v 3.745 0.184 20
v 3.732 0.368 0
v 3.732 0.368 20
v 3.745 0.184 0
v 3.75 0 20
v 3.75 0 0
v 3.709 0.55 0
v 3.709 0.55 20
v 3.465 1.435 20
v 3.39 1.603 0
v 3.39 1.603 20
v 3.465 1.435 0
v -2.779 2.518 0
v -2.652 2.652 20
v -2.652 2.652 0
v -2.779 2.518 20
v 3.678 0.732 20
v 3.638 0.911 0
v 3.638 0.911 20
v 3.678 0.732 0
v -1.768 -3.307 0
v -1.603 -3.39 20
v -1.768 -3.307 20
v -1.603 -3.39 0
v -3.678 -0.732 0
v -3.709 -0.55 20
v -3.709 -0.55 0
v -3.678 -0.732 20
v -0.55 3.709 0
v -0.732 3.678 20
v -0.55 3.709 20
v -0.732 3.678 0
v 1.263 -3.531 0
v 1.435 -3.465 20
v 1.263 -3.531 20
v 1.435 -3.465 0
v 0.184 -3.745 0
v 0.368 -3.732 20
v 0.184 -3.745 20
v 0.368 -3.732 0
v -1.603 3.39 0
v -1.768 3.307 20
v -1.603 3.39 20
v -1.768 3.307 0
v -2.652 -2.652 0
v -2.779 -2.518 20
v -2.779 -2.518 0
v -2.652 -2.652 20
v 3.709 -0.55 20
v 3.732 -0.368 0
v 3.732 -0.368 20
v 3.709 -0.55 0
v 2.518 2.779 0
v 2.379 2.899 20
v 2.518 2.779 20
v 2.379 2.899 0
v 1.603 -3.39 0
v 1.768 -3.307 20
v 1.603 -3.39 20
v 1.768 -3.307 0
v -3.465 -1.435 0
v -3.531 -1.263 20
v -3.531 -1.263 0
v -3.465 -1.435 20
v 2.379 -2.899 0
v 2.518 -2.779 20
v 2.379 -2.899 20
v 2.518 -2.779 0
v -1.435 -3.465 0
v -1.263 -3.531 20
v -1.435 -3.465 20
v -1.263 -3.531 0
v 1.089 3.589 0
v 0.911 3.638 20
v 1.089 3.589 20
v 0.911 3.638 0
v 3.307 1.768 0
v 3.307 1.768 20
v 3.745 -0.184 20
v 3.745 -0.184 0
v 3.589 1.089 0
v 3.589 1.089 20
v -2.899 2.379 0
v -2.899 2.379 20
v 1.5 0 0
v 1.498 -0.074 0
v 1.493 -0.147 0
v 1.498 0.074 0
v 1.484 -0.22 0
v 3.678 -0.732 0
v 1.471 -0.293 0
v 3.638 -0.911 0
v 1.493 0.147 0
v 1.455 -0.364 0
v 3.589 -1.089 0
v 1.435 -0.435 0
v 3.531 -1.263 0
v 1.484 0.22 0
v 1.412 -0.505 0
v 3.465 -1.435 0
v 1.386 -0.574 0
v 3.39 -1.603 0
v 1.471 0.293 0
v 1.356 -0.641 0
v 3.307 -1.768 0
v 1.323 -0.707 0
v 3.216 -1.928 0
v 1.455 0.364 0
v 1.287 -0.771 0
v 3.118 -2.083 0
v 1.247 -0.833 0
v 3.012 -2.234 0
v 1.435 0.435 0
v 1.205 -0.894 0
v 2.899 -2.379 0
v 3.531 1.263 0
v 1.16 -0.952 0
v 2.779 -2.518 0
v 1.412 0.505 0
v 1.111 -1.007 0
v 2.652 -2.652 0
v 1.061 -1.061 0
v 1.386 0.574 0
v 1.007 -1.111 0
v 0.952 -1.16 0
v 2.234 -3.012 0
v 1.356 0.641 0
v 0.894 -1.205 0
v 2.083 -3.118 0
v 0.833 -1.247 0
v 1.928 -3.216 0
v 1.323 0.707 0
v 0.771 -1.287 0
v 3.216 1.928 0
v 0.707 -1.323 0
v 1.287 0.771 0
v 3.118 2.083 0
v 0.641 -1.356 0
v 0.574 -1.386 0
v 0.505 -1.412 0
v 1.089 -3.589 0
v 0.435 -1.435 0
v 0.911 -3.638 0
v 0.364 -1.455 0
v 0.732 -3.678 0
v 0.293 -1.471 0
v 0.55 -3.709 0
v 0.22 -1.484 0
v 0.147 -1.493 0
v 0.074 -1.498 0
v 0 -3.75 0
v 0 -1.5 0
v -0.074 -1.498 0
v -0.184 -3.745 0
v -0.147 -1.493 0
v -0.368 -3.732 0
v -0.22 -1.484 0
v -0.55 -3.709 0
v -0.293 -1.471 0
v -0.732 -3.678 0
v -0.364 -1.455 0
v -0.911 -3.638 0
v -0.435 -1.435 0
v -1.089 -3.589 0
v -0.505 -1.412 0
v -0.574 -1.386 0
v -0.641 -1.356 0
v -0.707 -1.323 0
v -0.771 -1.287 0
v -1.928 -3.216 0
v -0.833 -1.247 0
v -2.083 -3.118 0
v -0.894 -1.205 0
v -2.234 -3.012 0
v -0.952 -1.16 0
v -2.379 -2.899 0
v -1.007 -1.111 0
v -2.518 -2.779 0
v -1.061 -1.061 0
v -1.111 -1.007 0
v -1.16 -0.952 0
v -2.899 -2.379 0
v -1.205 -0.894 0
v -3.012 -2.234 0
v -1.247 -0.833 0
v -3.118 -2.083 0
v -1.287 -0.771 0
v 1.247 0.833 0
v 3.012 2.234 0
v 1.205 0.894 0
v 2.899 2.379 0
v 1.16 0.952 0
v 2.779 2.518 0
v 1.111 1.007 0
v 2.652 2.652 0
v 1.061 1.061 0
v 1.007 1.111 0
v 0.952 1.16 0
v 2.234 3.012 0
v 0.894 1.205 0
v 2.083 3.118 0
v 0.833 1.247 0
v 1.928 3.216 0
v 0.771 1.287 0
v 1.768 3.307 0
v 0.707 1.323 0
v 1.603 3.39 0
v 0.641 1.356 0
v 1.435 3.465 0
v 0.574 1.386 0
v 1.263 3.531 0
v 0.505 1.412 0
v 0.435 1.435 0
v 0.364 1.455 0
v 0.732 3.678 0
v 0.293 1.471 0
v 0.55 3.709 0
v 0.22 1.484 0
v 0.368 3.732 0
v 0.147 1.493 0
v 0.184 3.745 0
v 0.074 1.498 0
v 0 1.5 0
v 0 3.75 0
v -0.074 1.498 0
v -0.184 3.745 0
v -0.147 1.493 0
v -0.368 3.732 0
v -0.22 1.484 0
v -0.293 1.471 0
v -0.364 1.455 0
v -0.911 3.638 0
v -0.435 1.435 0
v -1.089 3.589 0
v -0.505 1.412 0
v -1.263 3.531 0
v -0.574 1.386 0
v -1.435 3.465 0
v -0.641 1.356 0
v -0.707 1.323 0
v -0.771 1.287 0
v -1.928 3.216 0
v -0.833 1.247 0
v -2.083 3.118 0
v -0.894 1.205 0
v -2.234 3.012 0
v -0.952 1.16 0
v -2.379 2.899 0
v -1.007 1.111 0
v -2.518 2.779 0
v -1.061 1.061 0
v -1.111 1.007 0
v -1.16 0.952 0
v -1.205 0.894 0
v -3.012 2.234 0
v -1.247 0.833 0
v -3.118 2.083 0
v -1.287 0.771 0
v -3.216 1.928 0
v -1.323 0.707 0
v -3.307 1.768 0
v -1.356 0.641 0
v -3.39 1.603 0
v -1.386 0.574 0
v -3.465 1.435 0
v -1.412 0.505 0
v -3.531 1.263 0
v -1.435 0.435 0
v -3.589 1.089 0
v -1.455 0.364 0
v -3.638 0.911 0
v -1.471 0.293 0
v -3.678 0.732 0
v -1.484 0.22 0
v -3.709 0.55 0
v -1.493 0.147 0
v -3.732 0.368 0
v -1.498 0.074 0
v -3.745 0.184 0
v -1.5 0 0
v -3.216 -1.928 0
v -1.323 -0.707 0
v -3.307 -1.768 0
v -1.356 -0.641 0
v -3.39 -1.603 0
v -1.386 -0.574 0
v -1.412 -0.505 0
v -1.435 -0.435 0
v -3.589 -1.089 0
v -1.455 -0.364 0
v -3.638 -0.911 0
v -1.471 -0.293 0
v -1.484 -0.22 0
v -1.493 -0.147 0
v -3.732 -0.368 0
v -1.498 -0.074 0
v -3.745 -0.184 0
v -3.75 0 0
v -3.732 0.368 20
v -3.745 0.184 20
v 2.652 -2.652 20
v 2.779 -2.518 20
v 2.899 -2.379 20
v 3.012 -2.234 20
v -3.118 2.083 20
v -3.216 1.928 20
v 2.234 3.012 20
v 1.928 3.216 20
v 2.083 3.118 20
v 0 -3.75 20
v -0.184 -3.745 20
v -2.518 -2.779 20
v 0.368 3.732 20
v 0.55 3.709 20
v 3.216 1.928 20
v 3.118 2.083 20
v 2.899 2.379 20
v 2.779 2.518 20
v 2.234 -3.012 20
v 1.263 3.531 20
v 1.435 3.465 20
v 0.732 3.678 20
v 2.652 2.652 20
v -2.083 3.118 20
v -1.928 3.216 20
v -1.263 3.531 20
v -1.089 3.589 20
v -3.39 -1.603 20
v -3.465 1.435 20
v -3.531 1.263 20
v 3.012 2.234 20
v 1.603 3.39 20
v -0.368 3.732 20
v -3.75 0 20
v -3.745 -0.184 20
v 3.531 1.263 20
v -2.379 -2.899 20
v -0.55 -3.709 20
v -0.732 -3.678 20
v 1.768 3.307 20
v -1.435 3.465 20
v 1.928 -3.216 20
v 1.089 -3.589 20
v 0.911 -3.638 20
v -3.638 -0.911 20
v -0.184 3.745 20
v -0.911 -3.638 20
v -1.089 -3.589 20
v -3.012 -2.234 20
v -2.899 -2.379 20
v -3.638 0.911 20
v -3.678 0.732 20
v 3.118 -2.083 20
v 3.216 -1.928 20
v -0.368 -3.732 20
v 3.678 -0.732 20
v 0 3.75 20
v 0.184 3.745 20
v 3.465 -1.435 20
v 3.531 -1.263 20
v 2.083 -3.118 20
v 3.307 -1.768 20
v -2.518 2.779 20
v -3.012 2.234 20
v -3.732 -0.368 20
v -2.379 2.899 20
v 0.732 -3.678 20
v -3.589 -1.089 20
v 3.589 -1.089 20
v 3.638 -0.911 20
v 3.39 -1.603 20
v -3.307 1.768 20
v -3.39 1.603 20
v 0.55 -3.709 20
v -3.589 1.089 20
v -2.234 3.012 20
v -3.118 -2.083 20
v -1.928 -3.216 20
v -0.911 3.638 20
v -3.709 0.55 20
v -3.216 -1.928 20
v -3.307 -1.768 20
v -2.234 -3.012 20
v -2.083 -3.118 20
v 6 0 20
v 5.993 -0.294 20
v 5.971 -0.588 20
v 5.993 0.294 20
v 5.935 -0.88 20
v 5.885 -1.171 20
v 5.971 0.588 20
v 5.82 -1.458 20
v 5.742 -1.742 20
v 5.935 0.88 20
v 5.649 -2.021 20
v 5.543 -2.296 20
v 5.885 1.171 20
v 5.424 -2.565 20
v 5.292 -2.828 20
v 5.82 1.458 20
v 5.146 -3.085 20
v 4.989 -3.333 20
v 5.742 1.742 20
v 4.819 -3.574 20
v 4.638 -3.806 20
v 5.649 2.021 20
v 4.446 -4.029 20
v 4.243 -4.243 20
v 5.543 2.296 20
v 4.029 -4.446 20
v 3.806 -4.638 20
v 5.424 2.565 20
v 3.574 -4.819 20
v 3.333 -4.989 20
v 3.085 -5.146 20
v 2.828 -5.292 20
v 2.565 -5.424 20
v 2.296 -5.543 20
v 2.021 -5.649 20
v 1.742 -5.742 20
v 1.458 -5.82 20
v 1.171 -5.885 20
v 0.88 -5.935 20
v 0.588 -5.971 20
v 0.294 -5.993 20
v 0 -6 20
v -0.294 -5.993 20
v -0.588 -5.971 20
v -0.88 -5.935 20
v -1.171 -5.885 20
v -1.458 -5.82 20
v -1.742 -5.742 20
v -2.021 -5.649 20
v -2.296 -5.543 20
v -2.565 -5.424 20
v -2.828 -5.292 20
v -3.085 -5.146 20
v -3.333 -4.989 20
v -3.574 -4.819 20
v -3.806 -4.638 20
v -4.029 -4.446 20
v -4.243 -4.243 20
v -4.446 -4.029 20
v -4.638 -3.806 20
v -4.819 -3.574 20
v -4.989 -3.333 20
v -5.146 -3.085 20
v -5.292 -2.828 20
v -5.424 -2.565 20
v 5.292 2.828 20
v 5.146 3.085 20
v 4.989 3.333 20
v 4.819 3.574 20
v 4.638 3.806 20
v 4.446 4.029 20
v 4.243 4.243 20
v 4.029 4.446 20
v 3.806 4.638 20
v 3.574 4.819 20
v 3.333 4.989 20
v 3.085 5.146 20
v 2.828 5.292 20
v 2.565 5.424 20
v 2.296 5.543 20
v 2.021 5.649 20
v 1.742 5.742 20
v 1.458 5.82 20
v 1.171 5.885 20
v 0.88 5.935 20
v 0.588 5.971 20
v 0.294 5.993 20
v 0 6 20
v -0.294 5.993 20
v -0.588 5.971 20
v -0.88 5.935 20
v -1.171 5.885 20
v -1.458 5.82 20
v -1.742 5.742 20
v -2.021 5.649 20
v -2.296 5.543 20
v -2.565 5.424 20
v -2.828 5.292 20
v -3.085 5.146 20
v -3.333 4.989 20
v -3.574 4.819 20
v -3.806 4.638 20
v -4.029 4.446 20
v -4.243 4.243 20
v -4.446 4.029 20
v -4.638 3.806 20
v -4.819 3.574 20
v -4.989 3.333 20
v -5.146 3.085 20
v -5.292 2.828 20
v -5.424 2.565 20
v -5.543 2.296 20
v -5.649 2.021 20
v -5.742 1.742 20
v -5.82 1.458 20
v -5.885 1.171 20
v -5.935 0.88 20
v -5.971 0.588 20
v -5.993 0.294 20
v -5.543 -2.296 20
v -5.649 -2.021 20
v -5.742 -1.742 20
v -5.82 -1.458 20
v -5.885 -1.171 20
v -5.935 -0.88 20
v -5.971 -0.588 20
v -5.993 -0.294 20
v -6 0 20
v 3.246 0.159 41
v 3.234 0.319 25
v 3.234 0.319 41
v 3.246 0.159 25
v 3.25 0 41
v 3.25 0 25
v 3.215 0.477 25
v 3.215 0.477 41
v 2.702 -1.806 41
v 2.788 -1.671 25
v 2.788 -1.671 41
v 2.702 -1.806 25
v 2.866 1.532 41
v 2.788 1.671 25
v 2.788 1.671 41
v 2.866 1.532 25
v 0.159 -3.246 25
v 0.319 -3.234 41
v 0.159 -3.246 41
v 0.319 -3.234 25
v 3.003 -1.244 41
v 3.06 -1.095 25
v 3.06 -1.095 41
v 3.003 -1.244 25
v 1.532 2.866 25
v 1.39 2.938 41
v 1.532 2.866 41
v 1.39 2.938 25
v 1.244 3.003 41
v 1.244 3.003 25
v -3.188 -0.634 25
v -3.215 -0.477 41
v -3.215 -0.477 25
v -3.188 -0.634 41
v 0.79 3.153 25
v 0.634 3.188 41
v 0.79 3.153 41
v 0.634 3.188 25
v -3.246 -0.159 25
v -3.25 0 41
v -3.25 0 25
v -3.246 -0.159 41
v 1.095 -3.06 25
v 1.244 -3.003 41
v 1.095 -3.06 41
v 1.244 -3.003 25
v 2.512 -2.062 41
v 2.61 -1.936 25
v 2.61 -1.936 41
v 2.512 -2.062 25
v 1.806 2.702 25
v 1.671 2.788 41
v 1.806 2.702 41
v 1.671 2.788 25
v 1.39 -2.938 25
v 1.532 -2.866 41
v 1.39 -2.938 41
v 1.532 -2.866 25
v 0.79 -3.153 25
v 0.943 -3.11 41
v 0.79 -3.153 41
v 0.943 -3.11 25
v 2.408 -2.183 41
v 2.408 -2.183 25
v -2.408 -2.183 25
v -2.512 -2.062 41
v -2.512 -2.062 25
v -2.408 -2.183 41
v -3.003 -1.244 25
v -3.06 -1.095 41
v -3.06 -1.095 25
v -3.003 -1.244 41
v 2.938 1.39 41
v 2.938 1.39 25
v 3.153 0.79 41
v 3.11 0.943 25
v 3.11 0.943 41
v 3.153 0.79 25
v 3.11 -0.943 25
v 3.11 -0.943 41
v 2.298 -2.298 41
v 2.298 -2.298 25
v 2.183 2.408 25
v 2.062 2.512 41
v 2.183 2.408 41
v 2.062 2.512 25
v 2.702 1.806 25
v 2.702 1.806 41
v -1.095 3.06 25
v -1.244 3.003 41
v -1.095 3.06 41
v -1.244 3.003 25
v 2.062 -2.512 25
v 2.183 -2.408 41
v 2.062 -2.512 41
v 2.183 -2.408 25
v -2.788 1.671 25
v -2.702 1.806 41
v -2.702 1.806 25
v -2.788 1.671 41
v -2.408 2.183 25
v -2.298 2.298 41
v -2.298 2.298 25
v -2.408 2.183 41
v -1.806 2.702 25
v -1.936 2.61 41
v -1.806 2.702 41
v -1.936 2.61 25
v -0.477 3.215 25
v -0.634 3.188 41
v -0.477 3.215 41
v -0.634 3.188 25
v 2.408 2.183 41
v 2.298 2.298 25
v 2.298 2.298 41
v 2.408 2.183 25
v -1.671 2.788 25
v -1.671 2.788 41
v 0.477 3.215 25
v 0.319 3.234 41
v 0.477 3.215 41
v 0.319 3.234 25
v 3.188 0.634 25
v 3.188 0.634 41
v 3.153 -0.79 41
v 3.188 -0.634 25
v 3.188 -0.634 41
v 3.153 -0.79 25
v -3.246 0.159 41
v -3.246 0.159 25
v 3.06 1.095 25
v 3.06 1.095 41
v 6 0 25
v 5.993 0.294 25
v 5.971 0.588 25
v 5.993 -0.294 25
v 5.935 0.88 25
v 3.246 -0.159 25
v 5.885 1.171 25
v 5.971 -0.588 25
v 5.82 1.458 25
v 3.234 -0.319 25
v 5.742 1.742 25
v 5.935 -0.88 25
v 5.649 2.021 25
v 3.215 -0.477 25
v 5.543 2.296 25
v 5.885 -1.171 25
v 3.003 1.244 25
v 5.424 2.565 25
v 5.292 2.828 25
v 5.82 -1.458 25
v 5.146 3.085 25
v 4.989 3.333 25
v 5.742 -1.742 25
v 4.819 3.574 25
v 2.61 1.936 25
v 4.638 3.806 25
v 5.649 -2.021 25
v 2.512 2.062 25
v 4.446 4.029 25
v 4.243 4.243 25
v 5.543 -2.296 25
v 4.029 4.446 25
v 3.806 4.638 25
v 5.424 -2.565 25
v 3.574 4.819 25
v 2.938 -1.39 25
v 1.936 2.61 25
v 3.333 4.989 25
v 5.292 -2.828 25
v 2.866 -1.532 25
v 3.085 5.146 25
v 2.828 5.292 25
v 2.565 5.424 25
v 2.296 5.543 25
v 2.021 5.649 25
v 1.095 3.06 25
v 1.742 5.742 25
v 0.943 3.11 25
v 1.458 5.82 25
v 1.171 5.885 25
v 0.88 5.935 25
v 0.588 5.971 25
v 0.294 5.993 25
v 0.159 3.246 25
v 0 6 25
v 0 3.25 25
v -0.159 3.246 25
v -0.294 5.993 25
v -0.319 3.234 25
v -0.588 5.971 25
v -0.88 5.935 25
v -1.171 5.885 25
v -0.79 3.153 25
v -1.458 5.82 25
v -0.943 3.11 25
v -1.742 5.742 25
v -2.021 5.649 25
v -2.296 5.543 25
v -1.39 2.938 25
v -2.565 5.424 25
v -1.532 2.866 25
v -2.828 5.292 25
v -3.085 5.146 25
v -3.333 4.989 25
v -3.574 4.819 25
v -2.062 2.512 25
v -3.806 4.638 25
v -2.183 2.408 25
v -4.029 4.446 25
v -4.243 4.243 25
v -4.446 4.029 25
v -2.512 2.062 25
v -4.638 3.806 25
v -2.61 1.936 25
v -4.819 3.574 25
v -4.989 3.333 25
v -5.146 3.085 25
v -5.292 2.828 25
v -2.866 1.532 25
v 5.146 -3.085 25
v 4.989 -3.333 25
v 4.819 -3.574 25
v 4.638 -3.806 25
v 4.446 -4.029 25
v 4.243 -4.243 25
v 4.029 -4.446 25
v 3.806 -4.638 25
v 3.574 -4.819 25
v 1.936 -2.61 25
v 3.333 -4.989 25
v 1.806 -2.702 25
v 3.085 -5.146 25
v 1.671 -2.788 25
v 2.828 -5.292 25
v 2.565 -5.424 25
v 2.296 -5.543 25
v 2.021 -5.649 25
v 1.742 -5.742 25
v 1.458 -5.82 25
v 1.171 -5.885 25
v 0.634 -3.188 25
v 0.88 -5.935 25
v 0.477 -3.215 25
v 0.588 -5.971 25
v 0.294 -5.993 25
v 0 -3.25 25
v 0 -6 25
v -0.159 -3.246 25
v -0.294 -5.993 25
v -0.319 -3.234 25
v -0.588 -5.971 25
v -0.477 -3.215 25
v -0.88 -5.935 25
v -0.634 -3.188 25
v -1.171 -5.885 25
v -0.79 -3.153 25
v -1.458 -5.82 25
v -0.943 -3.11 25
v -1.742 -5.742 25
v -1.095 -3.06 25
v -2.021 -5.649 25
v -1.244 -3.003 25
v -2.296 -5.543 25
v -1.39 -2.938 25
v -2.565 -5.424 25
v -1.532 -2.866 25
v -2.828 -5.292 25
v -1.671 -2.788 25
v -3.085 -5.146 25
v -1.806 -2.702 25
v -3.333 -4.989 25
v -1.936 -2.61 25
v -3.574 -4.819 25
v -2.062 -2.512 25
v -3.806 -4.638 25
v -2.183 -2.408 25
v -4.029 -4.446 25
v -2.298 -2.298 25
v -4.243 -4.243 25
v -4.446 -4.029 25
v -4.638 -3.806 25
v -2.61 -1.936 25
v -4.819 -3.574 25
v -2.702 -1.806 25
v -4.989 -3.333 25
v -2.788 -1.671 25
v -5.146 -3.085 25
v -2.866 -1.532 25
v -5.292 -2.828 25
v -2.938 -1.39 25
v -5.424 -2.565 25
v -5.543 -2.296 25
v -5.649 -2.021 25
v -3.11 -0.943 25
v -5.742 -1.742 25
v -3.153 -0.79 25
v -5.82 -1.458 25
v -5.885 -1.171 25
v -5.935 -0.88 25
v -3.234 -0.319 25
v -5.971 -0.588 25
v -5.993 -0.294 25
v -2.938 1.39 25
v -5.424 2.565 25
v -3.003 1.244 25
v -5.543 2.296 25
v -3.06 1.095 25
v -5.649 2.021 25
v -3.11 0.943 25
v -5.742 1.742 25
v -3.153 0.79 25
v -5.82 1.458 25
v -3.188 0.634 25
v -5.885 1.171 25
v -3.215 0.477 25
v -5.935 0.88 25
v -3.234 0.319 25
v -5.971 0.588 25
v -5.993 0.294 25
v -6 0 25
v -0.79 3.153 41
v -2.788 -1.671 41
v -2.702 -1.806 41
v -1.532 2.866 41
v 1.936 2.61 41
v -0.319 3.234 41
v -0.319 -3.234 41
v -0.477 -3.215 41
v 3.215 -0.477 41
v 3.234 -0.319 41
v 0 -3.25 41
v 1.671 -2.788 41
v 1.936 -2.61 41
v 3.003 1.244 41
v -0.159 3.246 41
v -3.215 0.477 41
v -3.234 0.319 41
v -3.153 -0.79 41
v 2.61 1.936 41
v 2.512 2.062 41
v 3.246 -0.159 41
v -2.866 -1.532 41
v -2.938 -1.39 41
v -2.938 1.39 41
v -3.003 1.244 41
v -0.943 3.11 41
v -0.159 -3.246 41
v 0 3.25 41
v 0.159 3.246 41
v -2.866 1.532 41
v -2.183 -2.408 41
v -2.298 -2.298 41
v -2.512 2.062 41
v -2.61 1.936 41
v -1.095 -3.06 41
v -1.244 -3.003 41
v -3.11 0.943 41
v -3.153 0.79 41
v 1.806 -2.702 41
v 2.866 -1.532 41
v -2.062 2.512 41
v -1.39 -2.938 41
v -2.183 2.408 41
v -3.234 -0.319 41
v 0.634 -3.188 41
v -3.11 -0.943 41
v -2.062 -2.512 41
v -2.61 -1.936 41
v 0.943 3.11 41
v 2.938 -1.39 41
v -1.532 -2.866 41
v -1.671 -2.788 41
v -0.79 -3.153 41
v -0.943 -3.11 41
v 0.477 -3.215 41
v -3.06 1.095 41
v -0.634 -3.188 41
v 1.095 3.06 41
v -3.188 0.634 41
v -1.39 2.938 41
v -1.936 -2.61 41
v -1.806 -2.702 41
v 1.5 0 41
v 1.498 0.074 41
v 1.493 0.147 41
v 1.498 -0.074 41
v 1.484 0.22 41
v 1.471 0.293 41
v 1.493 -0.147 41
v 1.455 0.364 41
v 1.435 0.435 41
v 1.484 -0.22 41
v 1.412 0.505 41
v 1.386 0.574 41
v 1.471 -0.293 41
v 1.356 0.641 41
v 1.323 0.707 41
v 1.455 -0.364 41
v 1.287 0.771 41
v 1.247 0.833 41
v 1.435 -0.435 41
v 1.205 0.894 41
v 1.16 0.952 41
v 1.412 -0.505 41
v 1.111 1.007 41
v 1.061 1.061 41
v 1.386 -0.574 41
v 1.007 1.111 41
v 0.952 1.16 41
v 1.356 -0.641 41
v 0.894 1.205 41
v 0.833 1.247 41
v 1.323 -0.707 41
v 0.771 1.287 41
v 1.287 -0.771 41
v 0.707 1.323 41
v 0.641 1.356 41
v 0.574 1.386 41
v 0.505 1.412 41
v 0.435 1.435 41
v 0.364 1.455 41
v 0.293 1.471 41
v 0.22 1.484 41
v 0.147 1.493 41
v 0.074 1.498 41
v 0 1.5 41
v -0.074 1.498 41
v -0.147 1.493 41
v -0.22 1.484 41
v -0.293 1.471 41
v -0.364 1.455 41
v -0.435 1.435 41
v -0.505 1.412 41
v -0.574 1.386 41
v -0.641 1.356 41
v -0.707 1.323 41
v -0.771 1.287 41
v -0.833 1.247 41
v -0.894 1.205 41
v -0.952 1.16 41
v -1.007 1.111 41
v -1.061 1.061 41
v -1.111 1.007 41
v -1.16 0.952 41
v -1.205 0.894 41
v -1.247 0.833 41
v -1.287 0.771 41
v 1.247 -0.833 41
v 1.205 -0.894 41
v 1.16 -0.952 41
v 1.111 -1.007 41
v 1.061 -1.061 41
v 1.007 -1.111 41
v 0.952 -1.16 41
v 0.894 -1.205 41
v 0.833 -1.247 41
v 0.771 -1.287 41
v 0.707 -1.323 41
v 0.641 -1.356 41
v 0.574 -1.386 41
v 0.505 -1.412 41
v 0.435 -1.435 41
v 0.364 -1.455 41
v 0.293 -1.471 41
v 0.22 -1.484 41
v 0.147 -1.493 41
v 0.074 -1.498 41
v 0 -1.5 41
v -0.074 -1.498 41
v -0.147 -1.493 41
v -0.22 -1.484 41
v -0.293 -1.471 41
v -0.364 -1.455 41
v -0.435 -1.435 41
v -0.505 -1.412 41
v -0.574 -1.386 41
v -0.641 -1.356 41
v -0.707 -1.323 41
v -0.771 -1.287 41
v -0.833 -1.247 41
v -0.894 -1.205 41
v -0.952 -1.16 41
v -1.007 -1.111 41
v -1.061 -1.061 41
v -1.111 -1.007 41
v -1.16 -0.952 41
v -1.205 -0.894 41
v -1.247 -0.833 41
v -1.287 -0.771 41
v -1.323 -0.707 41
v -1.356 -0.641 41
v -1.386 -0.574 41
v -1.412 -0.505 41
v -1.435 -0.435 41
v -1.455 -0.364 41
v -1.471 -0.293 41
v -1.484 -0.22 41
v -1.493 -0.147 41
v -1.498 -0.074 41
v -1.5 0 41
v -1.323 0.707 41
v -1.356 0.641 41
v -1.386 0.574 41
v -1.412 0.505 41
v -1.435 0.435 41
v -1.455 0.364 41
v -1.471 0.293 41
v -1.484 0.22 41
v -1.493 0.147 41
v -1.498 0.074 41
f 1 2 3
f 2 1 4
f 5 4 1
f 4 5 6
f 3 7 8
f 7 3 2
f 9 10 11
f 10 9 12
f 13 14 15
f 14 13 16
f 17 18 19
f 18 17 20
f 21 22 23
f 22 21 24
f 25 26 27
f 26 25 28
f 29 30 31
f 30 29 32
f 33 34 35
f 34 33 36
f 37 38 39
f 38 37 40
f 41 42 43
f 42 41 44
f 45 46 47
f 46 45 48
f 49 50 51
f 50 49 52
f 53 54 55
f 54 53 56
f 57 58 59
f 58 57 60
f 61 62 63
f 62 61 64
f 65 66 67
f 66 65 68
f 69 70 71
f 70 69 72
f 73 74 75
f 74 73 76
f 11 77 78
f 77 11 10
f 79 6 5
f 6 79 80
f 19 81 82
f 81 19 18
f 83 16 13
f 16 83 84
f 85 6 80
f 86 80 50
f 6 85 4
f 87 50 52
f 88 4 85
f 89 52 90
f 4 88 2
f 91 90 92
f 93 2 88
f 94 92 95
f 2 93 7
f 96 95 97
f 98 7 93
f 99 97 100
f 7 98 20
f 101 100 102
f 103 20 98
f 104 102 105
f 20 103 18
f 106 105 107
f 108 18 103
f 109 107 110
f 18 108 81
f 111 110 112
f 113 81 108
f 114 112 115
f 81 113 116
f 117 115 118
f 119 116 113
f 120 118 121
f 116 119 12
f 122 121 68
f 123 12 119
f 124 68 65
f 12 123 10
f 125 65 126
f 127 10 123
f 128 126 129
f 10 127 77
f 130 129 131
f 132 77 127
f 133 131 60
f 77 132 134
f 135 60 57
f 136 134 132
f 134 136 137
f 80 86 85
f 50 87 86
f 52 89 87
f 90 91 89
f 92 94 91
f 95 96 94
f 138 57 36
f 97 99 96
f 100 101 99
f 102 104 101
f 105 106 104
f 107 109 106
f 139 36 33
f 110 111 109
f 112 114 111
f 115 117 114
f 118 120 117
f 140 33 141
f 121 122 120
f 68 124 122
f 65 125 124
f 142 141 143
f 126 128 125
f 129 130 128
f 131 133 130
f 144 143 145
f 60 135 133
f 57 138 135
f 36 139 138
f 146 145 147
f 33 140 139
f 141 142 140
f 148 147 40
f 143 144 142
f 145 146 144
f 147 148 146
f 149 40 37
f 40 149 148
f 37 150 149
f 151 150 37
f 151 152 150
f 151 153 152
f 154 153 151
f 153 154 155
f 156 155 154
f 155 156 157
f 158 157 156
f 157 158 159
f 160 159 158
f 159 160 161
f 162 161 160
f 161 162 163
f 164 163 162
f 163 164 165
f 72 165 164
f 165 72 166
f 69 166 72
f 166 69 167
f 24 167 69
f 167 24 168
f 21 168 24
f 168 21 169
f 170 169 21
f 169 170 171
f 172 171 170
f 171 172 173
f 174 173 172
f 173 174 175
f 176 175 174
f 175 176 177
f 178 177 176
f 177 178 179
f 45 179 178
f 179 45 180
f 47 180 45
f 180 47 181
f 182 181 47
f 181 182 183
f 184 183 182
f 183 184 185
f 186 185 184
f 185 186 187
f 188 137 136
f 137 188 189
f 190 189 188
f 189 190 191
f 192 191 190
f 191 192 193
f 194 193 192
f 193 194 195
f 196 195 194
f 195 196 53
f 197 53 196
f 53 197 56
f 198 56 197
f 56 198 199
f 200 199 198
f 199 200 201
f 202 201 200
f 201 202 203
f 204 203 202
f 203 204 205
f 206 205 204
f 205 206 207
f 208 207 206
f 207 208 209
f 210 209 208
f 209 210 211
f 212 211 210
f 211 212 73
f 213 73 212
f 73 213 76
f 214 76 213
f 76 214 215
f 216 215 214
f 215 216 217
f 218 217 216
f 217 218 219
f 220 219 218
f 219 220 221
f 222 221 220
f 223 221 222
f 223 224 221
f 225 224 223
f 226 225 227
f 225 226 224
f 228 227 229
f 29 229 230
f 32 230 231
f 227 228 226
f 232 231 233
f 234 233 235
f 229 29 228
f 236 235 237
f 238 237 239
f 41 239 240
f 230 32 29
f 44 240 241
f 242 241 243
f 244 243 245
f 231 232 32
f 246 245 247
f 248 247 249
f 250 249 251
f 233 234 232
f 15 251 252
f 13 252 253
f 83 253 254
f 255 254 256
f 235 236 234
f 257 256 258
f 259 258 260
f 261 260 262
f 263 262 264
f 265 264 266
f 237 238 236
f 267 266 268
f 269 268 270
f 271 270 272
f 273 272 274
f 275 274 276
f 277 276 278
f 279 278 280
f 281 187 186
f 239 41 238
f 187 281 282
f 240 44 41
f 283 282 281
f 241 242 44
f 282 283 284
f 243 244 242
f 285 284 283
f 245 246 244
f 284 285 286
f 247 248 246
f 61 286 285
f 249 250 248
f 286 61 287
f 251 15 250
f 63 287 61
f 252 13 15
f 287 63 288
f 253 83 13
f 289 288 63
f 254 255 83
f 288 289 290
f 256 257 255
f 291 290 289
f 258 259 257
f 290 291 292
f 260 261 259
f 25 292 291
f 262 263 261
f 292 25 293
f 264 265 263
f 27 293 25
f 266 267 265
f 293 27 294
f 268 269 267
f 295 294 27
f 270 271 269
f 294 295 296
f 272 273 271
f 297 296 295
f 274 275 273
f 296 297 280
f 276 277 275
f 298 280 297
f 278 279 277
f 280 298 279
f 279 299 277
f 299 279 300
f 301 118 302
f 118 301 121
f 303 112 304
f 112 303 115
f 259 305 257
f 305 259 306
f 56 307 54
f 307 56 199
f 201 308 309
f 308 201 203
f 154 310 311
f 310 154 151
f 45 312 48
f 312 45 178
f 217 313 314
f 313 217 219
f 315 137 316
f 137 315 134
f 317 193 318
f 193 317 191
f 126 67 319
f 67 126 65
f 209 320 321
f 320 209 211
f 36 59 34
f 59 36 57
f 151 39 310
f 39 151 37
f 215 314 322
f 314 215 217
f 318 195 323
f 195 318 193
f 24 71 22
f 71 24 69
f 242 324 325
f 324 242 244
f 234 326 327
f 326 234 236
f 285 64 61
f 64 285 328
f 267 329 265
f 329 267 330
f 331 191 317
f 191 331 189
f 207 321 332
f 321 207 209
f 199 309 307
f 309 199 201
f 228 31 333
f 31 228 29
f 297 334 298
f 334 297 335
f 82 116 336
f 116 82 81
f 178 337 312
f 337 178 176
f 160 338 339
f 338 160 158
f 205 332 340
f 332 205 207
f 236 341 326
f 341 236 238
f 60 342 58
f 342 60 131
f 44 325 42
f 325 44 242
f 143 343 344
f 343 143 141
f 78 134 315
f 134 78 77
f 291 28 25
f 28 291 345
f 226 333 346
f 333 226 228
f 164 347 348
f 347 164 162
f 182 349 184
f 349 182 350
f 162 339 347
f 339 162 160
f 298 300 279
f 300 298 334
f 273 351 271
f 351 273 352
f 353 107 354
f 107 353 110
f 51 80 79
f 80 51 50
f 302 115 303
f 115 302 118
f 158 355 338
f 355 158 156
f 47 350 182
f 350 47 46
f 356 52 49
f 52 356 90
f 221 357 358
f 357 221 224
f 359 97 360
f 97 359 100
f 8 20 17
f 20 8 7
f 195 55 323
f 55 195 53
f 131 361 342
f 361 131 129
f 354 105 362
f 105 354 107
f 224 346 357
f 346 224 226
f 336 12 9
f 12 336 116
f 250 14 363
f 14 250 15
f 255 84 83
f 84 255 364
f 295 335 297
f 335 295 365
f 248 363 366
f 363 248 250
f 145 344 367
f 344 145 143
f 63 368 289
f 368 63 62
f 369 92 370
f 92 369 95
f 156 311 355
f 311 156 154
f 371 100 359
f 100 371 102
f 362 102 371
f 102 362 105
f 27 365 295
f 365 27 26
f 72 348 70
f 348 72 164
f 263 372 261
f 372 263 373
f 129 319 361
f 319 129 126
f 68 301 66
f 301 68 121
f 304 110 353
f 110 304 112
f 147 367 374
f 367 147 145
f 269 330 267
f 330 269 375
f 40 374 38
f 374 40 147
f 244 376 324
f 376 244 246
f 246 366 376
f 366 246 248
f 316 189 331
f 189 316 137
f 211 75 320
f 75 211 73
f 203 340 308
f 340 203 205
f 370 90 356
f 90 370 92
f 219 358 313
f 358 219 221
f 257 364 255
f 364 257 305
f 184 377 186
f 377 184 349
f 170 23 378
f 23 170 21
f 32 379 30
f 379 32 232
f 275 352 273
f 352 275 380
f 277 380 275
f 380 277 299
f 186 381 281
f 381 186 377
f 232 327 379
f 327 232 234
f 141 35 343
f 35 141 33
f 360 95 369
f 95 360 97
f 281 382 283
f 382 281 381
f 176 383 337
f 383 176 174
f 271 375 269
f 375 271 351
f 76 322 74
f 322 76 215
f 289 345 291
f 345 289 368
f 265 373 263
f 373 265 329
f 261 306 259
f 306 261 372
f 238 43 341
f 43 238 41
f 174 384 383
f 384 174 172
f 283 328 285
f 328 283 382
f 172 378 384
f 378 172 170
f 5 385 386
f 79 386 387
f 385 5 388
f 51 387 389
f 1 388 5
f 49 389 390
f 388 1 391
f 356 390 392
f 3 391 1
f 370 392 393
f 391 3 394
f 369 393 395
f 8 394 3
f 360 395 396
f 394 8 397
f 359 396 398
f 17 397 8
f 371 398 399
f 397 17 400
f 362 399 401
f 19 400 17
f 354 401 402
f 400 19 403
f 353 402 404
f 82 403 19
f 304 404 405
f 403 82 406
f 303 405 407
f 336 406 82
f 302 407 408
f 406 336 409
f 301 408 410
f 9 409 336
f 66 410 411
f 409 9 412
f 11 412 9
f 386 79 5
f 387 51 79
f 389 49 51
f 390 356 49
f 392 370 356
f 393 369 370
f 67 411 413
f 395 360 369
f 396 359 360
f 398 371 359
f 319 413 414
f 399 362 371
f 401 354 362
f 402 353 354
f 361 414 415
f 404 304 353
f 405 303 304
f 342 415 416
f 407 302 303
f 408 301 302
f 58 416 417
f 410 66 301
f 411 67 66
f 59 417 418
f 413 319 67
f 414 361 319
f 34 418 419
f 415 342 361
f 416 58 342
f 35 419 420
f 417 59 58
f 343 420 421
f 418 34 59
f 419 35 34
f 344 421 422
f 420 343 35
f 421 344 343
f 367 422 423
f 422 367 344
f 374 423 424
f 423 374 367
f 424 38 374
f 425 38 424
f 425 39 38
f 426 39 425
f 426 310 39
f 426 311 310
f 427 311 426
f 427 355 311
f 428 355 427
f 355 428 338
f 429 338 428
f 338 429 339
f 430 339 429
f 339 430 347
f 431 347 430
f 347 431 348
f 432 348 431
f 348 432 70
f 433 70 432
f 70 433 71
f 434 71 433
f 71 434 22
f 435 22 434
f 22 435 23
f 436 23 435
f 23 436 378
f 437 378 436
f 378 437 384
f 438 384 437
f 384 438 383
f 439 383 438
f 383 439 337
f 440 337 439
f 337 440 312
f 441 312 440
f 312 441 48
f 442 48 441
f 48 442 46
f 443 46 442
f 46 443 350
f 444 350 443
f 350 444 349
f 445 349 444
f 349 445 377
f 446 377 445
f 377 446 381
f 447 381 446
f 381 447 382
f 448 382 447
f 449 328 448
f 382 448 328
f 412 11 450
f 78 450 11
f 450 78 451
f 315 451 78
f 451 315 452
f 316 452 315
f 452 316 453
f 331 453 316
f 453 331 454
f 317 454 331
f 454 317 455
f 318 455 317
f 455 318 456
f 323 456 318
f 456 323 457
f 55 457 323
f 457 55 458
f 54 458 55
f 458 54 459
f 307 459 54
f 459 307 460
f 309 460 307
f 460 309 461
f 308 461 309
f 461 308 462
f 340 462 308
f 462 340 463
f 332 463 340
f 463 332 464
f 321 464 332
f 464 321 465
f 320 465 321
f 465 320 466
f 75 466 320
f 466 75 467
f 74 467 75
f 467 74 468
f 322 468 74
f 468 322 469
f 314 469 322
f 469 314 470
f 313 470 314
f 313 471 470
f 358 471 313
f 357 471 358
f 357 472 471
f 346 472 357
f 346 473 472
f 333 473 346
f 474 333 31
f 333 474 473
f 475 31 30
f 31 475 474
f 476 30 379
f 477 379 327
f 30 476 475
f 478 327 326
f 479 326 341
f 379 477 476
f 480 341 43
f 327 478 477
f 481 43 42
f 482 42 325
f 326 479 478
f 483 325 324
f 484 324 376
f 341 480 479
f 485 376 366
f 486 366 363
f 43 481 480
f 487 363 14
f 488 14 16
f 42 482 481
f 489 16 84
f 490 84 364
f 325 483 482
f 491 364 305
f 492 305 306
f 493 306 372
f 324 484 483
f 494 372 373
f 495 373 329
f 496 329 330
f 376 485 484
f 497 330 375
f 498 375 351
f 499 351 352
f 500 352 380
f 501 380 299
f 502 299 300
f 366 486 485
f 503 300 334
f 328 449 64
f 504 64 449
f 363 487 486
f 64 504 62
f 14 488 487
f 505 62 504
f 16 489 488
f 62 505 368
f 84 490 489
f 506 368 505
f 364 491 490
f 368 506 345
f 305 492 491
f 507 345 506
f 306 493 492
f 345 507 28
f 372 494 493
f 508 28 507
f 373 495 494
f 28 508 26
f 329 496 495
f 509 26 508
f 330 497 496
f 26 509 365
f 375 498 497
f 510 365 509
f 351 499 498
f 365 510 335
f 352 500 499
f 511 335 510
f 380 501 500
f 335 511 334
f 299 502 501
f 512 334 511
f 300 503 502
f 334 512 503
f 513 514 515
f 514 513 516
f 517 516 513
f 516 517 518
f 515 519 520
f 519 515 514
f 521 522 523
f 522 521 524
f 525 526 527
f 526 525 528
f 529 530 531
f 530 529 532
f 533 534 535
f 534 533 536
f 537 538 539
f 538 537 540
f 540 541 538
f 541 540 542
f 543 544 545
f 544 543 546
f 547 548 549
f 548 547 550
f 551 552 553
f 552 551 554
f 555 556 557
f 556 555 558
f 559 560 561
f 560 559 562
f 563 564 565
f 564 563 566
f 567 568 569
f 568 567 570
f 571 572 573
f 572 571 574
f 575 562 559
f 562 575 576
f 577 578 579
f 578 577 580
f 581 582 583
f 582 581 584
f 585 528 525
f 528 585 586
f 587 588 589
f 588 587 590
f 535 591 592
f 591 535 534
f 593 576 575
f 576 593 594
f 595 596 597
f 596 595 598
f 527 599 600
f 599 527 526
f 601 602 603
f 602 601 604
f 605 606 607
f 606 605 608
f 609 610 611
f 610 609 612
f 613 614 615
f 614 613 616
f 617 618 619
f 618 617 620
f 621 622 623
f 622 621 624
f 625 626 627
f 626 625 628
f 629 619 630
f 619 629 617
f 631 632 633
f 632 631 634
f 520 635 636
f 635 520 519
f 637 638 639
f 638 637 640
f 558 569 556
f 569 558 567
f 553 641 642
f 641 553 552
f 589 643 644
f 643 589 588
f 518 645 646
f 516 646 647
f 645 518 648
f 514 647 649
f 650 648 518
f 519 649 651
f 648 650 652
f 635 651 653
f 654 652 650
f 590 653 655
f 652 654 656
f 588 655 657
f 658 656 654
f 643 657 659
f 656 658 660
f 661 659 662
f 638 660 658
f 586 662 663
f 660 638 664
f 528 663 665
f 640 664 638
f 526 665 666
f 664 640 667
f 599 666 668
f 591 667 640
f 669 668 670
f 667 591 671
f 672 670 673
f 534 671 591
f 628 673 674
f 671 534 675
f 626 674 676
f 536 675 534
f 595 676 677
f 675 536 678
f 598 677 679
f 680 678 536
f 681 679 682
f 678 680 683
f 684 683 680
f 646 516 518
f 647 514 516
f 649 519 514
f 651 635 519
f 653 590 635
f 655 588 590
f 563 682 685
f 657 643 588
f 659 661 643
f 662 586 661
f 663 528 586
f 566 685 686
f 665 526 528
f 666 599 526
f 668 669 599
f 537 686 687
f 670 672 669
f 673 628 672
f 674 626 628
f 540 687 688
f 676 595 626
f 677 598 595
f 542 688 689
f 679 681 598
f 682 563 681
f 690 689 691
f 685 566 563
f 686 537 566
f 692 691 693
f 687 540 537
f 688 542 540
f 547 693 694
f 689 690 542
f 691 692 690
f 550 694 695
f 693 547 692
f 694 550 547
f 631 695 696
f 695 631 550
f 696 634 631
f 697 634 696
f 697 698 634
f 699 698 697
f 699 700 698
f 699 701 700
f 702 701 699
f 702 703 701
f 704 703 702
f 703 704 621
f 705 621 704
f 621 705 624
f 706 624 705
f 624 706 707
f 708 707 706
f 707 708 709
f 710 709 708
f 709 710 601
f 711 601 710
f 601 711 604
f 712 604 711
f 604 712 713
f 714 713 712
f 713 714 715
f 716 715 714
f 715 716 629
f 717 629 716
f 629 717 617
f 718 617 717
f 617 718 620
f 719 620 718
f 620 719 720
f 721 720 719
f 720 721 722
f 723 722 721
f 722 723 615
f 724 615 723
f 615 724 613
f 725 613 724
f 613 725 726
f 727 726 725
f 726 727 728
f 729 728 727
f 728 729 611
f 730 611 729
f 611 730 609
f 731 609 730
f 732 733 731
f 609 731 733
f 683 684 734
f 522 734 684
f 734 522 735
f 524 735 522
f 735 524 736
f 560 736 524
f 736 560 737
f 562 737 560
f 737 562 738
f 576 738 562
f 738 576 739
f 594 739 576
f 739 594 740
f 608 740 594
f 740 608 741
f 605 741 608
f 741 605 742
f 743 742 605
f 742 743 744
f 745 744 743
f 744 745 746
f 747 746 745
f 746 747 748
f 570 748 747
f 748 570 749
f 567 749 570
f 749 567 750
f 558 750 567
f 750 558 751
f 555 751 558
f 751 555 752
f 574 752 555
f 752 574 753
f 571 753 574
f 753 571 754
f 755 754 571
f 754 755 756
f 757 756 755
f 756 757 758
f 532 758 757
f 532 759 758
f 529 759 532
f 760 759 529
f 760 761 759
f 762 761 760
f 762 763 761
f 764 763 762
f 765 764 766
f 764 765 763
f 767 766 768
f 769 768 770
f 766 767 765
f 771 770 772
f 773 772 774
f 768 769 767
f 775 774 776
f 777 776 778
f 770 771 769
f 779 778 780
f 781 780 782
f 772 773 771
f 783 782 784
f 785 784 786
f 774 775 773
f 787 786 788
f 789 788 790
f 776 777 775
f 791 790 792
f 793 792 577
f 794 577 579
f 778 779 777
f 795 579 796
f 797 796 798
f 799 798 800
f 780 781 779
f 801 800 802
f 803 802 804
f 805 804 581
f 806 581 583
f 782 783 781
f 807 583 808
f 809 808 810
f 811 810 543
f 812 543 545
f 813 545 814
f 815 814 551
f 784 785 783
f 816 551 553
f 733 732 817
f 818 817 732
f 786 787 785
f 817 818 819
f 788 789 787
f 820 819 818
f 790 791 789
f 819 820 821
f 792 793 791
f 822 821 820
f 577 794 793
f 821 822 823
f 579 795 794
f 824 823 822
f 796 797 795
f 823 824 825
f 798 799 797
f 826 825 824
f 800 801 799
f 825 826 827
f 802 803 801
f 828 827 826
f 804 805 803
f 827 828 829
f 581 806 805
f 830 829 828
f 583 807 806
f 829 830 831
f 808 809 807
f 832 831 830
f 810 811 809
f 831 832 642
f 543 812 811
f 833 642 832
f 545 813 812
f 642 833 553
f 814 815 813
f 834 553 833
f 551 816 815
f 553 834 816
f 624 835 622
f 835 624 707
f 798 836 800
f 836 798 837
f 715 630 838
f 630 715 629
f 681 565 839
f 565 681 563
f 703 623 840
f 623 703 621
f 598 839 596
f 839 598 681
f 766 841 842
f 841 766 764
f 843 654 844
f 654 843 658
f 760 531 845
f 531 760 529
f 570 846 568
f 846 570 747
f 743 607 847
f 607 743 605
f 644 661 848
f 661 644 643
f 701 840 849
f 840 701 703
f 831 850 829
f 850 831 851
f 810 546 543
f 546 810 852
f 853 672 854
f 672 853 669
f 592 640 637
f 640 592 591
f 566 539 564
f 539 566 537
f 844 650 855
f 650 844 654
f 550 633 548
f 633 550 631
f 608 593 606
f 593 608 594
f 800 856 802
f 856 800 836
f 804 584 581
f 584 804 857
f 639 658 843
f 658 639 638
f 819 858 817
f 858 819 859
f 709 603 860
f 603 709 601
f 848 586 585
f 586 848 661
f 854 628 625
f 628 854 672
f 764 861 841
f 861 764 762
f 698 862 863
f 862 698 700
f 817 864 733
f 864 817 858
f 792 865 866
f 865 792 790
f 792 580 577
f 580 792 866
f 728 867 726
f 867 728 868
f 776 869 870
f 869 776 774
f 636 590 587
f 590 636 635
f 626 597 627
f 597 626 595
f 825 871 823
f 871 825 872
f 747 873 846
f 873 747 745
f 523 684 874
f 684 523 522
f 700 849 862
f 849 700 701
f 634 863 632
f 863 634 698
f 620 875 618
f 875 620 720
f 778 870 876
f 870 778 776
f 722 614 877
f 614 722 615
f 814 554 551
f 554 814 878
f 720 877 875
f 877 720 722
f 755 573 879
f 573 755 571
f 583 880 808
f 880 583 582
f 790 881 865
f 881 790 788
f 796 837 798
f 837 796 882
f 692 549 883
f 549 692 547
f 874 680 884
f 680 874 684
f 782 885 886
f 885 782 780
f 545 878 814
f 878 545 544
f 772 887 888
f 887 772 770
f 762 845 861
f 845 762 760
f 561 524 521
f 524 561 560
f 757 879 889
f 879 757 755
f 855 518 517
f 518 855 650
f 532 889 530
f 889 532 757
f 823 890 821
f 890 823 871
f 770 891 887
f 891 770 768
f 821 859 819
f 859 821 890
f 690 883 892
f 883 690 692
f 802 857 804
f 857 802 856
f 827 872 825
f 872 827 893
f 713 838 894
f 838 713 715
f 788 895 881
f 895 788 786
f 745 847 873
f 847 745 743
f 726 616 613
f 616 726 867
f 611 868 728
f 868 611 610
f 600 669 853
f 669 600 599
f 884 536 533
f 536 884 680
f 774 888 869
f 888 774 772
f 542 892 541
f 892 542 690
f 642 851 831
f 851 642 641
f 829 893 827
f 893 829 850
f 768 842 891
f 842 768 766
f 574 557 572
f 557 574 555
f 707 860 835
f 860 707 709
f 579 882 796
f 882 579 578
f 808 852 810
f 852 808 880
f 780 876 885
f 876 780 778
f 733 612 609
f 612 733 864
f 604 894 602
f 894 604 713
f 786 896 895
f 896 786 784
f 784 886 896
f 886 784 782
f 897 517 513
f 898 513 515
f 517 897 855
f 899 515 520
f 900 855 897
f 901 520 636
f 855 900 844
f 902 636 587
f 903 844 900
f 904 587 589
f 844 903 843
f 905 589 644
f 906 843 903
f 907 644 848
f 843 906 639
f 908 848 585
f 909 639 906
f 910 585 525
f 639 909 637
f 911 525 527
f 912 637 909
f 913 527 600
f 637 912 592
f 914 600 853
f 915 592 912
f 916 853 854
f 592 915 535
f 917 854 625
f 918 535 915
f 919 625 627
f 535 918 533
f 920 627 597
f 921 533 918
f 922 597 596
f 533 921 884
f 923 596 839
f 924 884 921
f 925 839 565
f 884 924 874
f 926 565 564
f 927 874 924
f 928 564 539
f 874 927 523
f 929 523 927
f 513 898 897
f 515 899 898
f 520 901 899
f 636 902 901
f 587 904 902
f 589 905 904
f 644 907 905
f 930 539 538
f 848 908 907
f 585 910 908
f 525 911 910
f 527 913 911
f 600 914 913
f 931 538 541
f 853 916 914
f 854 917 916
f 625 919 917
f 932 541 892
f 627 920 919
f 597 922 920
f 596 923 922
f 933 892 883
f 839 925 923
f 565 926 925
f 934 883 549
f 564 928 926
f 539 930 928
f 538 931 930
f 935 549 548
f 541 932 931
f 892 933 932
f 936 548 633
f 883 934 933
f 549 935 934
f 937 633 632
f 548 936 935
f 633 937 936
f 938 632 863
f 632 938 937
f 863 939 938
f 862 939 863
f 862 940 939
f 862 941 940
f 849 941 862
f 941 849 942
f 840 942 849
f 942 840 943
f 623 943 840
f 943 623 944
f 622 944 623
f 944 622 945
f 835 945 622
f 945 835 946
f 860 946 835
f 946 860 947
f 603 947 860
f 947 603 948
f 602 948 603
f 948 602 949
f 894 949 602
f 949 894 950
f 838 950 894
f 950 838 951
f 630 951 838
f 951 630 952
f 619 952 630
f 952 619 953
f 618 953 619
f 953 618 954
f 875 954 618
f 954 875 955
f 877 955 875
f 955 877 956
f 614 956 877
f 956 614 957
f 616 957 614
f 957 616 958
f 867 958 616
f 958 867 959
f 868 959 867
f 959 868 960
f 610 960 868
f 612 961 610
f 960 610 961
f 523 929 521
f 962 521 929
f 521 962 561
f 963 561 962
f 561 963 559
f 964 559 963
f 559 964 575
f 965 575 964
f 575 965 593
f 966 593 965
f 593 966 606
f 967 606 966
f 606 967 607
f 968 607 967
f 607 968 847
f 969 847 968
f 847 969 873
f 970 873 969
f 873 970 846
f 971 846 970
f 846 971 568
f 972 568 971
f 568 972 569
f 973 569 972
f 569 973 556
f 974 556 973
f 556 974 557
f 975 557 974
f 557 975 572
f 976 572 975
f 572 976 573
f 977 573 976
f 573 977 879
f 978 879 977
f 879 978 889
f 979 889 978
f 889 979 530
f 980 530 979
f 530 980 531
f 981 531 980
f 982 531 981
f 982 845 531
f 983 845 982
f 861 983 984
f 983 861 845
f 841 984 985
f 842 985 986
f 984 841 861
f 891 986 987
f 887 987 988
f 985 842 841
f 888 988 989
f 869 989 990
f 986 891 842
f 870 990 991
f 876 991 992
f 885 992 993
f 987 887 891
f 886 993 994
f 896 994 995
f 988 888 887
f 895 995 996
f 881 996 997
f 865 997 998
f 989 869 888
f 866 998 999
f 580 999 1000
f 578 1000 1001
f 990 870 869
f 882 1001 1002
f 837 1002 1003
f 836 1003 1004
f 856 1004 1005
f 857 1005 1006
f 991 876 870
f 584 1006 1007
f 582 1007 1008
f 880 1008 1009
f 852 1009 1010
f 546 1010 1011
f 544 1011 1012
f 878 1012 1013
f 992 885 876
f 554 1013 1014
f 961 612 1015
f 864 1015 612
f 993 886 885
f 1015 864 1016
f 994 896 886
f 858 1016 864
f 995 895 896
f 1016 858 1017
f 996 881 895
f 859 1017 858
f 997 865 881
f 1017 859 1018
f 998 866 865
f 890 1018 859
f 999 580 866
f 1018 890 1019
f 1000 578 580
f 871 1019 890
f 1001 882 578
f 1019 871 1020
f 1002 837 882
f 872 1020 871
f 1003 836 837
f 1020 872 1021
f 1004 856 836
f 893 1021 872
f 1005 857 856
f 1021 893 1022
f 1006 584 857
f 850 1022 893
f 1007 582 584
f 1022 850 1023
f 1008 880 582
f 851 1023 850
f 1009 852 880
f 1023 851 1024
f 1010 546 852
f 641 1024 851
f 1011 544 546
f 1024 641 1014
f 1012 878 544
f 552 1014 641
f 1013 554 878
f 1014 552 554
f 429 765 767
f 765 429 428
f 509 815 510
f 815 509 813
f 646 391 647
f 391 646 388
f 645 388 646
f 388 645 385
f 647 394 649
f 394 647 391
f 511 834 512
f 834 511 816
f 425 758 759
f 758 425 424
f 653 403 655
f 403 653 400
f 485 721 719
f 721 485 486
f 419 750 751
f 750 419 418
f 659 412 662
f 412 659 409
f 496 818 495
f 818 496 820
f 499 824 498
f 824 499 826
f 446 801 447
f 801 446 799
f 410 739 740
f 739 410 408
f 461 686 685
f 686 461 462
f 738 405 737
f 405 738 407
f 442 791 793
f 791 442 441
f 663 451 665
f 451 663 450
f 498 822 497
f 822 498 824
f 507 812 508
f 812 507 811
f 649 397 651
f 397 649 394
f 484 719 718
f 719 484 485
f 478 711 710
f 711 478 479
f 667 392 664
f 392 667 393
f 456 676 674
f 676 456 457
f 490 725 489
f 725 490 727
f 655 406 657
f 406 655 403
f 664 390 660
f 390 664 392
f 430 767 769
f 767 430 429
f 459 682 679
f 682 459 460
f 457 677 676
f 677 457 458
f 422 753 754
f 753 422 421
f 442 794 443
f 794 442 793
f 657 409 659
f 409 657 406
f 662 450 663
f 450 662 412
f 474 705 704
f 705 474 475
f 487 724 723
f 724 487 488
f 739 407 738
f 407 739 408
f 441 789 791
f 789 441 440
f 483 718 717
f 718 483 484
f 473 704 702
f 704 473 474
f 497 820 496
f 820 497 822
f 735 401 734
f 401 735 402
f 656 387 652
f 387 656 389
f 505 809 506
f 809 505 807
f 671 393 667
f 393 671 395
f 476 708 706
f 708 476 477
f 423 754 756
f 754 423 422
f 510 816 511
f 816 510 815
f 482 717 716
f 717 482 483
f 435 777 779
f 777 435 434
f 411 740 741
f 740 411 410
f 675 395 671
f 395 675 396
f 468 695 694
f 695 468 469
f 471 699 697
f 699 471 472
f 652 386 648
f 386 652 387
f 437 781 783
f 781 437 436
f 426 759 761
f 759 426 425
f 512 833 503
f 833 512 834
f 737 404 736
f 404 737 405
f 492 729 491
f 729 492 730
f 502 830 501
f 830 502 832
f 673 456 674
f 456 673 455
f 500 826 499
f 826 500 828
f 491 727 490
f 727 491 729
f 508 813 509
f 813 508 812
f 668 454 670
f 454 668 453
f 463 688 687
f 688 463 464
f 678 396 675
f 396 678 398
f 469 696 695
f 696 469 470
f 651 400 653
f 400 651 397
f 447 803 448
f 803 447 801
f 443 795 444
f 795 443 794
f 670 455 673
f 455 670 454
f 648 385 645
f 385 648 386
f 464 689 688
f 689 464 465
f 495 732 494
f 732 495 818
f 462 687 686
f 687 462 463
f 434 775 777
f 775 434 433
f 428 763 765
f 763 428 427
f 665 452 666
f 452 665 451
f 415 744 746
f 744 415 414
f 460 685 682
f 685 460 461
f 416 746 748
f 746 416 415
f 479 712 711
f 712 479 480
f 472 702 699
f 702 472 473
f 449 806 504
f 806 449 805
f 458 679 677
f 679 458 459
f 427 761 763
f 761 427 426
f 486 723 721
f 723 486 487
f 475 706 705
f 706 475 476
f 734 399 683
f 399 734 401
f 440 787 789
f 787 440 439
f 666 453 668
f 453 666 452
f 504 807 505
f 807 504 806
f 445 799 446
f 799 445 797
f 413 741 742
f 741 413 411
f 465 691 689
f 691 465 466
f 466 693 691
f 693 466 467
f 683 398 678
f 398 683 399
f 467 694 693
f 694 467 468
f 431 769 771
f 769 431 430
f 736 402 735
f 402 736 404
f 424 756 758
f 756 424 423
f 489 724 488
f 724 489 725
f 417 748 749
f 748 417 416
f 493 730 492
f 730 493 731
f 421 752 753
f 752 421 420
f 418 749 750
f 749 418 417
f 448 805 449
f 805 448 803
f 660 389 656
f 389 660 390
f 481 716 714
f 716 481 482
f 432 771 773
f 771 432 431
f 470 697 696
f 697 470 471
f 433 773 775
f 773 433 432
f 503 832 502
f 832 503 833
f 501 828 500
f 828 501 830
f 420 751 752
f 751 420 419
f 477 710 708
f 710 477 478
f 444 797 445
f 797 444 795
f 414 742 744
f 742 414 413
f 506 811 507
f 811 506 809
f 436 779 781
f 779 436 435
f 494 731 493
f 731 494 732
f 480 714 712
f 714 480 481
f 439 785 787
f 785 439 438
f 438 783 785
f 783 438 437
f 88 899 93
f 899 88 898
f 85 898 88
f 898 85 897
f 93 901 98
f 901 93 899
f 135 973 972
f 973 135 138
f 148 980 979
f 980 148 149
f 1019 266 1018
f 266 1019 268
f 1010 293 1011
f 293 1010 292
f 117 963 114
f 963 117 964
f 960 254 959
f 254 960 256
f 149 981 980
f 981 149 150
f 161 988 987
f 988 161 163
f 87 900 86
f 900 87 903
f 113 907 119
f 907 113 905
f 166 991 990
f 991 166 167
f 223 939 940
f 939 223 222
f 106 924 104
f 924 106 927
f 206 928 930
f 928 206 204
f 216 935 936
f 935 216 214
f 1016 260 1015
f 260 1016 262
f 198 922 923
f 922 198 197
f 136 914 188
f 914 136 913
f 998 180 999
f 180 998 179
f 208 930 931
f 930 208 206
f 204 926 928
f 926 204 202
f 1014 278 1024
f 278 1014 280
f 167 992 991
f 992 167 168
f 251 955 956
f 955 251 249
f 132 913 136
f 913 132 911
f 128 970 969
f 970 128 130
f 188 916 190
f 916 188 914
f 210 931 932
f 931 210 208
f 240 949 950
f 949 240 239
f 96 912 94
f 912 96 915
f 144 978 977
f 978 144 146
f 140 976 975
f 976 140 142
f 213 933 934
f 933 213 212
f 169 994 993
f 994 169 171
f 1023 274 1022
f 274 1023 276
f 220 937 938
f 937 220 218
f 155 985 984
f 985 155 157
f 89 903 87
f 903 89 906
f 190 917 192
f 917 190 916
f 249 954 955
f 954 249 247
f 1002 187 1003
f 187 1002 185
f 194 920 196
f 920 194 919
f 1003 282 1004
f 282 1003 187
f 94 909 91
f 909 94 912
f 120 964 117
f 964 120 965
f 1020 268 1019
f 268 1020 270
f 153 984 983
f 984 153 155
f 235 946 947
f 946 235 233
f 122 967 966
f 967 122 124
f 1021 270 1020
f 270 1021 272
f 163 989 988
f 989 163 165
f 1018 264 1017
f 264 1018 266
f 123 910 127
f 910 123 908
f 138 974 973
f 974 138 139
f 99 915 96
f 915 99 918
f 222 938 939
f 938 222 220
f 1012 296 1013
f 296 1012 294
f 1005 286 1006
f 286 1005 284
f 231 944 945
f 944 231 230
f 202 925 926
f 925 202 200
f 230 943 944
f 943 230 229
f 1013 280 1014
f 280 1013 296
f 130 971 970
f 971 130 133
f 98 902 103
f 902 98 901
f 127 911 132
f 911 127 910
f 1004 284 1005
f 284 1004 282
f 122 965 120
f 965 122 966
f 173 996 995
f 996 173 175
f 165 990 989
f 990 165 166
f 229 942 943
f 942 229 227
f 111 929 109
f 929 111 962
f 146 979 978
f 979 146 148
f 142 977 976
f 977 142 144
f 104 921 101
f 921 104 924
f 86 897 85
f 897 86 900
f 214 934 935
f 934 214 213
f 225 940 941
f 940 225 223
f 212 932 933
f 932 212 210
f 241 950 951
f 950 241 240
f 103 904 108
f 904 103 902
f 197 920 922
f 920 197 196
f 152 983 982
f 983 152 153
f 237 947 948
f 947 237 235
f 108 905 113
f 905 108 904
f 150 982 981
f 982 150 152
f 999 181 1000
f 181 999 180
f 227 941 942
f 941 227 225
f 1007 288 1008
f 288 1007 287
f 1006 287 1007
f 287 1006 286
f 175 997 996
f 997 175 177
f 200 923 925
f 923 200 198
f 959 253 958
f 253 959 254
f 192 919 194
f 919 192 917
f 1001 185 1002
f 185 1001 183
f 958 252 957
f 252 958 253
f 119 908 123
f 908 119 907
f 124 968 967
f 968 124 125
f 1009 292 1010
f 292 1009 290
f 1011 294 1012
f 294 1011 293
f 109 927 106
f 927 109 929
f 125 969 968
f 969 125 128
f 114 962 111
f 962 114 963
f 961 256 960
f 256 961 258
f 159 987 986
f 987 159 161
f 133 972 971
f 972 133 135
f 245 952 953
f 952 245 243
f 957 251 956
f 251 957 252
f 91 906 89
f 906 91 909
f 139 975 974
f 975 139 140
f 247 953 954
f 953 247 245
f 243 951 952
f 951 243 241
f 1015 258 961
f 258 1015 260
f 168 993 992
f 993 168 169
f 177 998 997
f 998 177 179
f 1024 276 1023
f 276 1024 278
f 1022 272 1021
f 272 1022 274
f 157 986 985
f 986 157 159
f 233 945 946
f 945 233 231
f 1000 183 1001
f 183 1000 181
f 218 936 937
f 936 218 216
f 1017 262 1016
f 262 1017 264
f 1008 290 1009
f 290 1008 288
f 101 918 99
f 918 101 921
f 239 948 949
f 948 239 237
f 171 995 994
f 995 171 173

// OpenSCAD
// Hose-barb reducer: joins 8 mm ID silicone tubing to 5 mm ID silicone tubing
// Print orientation: standing upright along +Z
// Units: mm. A 3 mm bore runs straight through the full length.

// ---------------- Parameters ----------------
reducer_length      = 41;   // total length (z = 0 to z = 41)
bore_d              = 3;    // through-bore diameter

// Lower section (z = 0..20): barbs for 8 mm tubing
lower_section_h     = 20;   // lower section height
barb_d_start        = 7.5;  // barb outer diameter at bottom of each barb
barb_d_top          = 9.5;  // barb outer diameter at top of each barb
barb_h              = 10;   // each barb height
barb_count          = 2;    // number of stacked barbs
barb_overlap        = 0;    // vertical overlap between barbs (none)

// Collar (z = 20..25)
collar_d            = 12;   // collar diameter
collar_h            = 5;    // collar height

// Upper section (z = 25..41): barbs for 5 mm tubing
upper_section_h     = 16;   // upper section height (25 to 41)
barb_d_start_u      = 6.5;  // barb outer diameter at bottom of each upper barb
barb_d_top_u        = 5.0;  // barb outer diameter at top of each upper barb
barb_h_u            = 8;    // each upper barb height
barb_count_u        = 2;    // number of stacked upper barbs
barb_overlap_u      = 0;    // vertical overlap between upper barbs

eps                  = 0.5;  // cutter overshoot past faces

$fn = 128;

// ---------------- Helpers ----------------
// Sawtooth outer diameter along Z: grows from start to top, then steps back
function saw_d(z, d_start, d_top, h) =
    (z < h * 0.8) ? d_start + (d_top - d_start) * z / (h * 0.8) :
                   d_start + (d_top - d_start) * 0.8;

// ---------------- Model ----------------
difference() {
    union() {
        // Lower section: stacked barbs
        for (i = [0 : barb_count - 1])
            translate([0, 0, i * (barb_h + barb_overlap)])
                cylinder(h = barb_h,
                         d = saw_d(0, barb_d_start, barb_d_top, barb_h));

        // Collar
        translate([0, 0, lower_section_h])
            cylinder(h = collar_h, d = collar_d);

        // Upper section: stacked barbs
        for (i = [0 : barb_count_u - 1])
            translate([0, 0, lower_section_h + collar_h +
                       i * (barb_h_u + barb_overlap_u)])
                cylinder(h = barb_h_u,
                         d = saw_d(0, barb_d_start_u, barb_d_top_u, barb_h_u));
    }

    // Through-bore
    translate([0, 0, -eps])
        cylinder(h = reducer_length + 2 * eps, d = bore_d);
}
